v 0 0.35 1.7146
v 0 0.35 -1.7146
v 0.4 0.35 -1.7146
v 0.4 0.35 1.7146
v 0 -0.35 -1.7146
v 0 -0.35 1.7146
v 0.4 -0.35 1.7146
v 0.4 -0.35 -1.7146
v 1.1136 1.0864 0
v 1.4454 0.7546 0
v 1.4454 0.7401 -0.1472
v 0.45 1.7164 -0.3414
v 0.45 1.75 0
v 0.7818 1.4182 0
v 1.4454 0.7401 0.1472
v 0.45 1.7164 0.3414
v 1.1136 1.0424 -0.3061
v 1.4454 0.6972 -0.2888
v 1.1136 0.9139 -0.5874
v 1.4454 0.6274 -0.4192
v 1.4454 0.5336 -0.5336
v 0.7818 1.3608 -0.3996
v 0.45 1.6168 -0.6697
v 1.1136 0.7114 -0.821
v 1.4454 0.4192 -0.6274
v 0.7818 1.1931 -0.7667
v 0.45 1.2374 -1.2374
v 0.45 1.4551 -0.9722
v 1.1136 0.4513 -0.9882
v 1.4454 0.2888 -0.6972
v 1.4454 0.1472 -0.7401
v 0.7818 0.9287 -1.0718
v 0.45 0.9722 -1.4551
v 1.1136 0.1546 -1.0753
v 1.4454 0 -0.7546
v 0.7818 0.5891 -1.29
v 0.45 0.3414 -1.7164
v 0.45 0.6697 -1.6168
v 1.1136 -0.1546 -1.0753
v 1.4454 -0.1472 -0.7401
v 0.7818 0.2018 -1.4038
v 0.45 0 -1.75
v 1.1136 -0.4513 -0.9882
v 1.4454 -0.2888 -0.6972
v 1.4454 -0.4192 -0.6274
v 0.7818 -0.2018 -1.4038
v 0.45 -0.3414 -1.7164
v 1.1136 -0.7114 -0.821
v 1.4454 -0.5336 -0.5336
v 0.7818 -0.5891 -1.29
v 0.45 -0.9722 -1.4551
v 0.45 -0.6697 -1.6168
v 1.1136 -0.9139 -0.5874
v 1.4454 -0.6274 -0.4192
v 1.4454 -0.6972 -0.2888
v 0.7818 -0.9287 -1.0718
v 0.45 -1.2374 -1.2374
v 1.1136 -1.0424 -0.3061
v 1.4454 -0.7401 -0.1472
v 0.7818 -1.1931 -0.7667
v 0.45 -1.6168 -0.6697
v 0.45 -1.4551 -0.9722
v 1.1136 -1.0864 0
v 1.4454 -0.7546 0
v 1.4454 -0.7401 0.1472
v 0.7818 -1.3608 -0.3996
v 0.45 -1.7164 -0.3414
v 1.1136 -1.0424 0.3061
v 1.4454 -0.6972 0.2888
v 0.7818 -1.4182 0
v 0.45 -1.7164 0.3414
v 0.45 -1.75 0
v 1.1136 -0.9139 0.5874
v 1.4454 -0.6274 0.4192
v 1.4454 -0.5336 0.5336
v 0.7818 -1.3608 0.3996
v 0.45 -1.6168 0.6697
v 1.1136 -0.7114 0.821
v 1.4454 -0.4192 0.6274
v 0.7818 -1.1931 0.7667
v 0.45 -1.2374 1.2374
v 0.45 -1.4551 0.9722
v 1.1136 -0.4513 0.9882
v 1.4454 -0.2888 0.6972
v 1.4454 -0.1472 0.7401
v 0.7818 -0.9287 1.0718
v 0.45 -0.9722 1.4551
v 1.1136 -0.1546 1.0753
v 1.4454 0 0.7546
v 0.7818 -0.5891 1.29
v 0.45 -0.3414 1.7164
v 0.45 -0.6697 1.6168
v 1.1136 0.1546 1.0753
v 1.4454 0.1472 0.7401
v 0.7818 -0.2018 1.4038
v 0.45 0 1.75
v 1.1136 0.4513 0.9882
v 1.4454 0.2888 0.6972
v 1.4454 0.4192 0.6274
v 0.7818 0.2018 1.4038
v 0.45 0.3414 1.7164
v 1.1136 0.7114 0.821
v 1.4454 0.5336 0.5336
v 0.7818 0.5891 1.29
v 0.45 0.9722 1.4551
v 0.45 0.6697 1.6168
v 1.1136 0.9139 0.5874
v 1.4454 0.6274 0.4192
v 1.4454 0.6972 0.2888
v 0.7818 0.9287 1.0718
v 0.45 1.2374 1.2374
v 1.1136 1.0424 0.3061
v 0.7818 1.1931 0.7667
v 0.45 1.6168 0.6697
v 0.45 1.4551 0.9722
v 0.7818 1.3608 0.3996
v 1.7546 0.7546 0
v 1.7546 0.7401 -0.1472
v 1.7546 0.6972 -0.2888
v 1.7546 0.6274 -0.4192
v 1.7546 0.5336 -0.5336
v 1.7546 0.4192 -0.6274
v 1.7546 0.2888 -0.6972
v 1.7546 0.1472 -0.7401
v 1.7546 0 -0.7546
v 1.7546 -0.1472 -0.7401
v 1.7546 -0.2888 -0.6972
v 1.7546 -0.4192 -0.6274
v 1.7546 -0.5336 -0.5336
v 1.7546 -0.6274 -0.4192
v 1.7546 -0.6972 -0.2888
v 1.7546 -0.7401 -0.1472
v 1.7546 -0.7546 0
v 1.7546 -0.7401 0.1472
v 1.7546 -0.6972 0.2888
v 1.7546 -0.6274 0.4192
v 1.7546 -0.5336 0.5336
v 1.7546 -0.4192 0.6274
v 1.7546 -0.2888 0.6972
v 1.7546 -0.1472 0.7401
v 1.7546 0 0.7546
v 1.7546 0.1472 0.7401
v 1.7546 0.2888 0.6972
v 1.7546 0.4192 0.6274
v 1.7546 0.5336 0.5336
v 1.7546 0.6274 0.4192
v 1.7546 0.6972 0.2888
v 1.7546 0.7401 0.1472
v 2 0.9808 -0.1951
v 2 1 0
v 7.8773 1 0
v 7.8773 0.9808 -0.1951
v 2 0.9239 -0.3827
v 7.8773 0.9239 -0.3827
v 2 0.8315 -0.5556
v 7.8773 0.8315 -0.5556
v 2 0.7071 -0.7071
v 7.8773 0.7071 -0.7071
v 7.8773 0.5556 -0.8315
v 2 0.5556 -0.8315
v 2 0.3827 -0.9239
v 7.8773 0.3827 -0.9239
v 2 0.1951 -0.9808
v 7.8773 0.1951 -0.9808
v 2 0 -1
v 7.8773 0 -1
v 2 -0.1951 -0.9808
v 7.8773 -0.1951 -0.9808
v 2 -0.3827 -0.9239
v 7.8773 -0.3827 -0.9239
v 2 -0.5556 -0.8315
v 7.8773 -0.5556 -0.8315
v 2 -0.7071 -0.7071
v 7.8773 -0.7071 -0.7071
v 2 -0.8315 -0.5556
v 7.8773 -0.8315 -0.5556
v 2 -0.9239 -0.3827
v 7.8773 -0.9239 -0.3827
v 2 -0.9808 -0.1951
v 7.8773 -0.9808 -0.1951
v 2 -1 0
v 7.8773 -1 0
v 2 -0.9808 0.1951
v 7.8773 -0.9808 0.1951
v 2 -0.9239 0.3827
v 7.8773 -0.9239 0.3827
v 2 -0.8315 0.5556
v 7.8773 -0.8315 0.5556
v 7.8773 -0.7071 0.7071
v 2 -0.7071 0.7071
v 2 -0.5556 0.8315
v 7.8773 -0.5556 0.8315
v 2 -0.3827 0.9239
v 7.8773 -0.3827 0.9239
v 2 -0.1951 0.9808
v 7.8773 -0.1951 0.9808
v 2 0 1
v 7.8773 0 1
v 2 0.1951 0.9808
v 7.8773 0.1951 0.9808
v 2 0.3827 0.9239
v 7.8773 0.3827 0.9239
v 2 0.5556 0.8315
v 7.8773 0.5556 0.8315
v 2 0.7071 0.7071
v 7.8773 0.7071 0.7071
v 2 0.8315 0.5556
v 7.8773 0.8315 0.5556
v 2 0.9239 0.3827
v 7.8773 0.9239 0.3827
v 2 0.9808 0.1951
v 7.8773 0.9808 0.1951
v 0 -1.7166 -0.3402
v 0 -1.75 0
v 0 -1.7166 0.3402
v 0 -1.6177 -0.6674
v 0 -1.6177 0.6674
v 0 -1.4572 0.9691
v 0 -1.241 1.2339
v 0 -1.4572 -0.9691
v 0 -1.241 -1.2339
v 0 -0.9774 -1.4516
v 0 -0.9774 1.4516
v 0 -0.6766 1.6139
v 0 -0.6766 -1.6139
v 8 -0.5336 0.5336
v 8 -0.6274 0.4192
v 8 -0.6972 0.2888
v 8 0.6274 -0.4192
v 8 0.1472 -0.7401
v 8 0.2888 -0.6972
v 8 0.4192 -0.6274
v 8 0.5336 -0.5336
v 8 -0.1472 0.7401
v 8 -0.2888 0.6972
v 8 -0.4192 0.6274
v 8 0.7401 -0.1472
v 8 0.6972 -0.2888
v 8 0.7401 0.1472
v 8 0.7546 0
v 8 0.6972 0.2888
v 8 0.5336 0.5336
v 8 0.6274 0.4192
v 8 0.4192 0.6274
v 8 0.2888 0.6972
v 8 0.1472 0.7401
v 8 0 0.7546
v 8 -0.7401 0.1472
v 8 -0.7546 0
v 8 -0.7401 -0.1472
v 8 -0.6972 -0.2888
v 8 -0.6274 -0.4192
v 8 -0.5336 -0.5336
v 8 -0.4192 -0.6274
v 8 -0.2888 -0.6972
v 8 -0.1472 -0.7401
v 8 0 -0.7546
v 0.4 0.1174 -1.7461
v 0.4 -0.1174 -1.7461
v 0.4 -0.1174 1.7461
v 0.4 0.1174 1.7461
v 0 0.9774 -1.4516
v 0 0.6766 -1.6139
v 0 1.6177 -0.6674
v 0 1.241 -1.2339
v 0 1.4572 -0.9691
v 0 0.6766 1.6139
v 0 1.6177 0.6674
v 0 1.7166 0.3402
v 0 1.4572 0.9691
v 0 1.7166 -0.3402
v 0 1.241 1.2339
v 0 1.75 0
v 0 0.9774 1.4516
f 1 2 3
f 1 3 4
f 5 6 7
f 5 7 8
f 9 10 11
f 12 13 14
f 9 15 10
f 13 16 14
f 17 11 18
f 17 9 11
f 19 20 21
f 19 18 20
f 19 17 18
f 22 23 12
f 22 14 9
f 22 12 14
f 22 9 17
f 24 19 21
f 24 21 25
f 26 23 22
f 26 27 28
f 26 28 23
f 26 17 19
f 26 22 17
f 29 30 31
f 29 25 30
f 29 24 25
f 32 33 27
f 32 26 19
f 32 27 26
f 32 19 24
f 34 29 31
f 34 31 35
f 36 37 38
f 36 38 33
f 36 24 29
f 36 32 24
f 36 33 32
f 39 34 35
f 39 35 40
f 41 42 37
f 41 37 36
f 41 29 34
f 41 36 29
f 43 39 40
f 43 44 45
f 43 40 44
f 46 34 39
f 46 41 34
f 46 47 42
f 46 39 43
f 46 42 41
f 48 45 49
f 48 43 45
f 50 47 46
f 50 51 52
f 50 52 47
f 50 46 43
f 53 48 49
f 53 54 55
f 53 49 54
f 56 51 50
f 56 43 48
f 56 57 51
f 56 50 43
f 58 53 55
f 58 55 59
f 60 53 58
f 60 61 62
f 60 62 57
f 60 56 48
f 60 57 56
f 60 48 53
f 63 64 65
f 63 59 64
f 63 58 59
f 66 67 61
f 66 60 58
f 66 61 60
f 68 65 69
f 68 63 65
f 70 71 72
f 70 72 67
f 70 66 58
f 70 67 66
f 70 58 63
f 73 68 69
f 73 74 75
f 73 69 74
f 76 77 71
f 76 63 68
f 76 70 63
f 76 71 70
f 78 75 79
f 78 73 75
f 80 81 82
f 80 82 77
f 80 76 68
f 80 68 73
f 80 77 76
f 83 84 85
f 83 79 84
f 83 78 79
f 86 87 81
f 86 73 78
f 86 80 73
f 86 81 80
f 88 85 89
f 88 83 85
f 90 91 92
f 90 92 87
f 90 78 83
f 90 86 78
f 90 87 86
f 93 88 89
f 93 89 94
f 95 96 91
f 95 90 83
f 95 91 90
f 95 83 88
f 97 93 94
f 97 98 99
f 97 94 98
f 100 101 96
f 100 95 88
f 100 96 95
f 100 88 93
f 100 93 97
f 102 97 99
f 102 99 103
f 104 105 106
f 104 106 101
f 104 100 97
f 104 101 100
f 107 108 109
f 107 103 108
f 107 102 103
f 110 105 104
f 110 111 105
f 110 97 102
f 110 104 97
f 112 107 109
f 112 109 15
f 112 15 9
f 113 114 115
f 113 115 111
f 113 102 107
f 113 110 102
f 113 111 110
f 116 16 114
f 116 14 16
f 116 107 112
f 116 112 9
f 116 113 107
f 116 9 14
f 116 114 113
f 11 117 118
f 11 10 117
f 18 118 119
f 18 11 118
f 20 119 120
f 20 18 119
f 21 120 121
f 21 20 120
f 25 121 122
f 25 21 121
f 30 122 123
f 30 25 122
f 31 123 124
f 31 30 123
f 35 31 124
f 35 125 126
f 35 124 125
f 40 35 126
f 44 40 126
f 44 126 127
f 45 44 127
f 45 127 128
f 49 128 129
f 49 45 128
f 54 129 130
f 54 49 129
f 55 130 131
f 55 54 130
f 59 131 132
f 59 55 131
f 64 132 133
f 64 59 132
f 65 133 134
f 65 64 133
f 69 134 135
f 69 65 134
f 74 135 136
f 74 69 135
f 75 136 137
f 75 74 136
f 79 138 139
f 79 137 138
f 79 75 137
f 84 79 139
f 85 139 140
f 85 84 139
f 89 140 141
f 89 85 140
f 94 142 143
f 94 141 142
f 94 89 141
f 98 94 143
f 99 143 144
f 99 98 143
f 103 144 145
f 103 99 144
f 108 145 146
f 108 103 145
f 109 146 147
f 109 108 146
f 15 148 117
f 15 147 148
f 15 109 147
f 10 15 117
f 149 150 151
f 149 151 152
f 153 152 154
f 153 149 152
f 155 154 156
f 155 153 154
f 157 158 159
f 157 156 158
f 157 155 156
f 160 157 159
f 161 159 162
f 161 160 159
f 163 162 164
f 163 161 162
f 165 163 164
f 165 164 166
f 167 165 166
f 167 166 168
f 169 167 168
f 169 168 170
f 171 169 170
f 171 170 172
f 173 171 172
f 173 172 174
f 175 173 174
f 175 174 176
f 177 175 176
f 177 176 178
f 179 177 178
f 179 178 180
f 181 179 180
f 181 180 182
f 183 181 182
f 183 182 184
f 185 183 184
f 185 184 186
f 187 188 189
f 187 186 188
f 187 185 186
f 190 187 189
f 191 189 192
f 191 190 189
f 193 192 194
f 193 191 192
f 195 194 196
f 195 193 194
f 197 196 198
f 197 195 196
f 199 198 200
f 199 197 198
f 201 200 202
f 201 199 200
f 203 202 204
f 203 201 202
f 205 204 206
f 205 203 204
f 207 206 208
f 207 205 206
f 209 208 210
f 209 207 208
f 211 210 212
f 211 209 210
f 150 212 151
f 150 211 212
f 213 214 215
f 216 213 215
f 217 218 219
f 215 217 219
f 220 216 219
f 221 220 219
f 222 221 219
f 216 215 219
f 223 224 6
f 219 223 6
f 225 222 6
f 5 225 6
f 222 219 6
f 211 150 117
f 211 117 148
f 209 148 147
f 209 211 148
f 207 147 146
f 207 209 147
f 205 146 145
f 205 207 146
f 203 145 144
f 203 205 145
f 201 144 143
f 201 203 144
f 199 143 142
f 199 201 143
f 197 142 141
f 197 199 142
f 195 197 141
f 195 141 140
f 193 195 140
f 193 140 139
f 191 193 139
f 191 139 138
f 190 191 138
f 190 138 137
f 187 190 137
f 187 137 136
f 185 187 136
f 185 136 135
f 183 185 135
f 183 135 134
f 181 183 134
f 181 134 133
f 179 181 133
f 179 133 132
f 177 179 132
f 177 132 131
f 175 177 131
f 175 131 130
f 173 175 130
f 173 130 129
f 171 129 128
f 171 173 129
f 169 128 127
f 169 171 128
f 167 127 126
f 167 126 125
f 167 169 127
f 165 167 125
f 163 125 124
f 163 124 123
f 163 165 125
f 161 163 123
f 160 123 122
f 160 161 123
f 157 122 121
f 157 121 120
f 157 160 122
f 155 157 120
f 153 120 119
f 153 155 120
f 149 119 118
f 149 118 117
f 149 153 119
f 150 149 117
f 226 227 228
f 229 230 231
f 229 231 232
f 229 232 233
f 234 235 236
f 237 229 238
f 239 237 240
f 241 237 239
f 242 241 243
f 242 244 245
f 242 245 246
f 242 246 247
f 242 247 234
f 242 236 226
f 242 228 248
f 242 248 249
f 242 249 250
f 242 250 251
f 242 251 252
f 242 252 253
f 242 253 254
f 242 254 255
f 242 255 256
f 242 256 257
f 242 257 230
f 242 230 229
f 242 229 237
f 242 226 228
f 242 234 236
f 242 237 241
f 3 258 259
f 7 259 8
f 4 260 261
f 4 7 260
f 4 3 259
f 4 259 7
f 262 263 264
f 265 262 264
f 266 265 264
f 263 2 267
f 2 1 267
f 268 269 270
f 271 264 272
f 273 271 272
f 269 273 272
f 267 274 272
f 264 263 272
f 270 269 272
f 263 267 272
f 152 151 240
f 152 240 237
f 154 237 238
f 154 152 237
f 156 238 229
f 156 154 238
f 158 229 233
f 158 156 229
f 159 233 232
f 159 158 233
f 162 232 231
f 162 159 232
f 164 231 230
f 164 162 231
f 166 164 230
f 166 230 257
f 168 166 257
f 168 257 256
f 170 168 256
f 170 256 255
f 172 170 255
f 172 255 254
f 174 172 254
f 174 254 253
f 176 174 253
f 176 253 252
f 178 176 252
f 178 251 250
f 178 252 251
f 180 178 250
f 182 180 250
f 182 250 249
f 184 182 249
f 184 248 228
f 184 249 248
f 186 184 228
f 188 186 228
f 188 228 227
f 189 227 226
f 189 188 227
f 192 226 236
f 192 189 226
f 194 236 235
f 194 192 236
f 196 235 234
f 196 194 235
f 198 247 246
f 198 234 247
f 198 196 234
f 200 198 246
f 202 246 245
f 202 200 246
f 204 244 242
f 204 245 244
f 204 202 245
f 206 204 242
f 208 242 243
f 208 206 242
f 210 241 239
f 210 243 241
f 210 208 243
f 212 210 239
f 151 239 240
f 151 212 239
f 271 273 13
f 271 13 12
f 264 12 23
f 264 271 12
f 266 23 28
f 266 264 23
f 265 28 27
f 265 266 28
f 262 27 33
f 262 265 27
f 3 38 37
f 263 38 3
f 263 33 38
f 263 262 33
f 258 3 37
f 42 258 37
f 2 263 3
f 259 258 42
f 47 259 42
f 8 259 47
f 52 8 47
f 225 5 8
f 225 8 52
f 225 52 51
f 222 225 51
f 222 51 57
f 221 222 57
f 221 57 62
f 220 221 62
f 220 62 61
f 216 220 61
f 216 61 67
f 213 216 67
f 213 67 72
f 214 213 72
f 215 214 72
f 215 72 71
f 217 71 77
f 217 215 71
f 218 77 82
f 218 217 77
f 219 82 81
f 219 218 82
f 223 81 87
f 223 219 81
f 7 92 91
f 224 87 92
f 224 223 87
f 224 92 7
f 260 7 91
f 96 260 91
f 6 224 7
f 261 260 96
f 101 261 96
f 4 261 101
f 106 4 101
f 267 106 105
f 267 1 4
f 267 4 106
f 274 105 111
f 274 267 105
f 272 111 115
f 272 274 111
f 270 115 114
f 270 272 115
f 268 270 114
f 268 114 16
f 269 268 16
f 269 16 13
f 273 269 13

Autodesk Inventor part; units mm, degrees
ref_plane "YZ Plane" through (0, 0, 0) normal (1, 0, 0) x (0, 1, 0)
ref_plane "XZ Plane" through (0, 0, 0) normal (0, 1, 0) x (-1, 0, 0)
sketch "Sketch1" plane through (0, 0, 0) normal (0, 0, 1) x (1, 0, 0)
  line L0 (0, 0) -> (8, 0)
  line L1 (8, 0) -> (8, 1)
  line L2 (8, 1) -> (2, 1)
  line L3 (2, 1) -> (1.7546, 0.7546)
  line L4 (1.7546, 0.7546) -> (1.4454, 0.7546)
  line L5 (1.4454, 0.7546) -> (0.45, 1.75)
  line L6 (0.45, 1.75) -> (0, 1.75)
  line L7 (0, 1.75) -> (0, 0)
  line L8 (2, 1) -> (1.2, 1) construction
  line L9 (-1.6, 0) -> (9.6, 0) projected
  line L10 (0, 2.1) -> (0, -0.35) projected
  dimension "d0" = 8
  dimension "d1" = 45
  dimension "d2" = 0.2454
  dimension "d3" = 6
  dimension "d4" = 1.2
  dimension "d5" = 1.5092
  dimension "d6" = 2
  dimension "d7" = 3.5
revolve "Body" add sketch "Sketch1" angle 360 about axis through (0, 0, 0) along (1, 0, 0)
sketch "Sketch2" plane through (0, 0, 0) normal (-1, 0, 0) x (0, 0, 1)
  line L0 (1.75, -0.35) -> (-1.75, -0.35)
  line L1 (-1.75, -0.35) -> (-1.75, 0.35)
  line L2 (-1.75, 0.35) -> (1.75, 0.35)
  line L3 (1.75, 0.35) -> (1.75, -0.35)
  line L4 (0, 0.35) -> (0, -0.35) construction
  line L5 (-1.75, 0) -> (1.75, 0) construction
  line L6 (0, 1.75) -> (0, 0) projected
  dimension "d15" = 0.7
  dimension "d16" = 3.5
extrude "Slot" cut sketch "Sketch2" against normal blind 0.4
thread "Thread" size "M2x0.4" class "6g" standard "ISO Metric profile" length 6
chamfer "Chamfer1" distance 0.2454 distance2 0.1227 1 edges at (8, -1, 0) measured on face at (8, -0.0858, 0.7069)
ref_plane "Work Plane1" through (33.575, 0, 0) normal (0, 0, -1) x (1, 0, 0)
equation "\"d0\" = NLG"
equation "\"d1\" = 0.5 * SEWI"
equation "\"d2\" = GAL"
equation "\"d3\" = GEL"
equation "\"d4\" = KOH"
equation "\"d5\" = BDM"
equation "\"d6\" = GD"
equation "\"d7\" = KOD"
equation "\"d15\" = SBR"
equation "\"d16\" = KOD"
equation "\"d8\" = STI"
equation "\"d10\" = GEL"
equation "\"d12\" = -0.5 * SPD + 0.5 * GD"
equation "\"d13\" = 0.5 * GAL"
equation "\"NLG\" = 8"
equation "\"GAL\" = 0.61345 * PTC"
equation "\"GEL\" = 6"
equation "\"KOH\" = 1.2"
equation "\"KOD\" = 3.5"
equation "\"SEWI\" = 90deg"
equation "\"BDM\" = NND - 1.2269 * PTC"
equation "\"GD\" = NND"
equation "\"SBR\" = 0.7"
equation "\"STI\" = 0.4"
equation "\"SPD\" = NND - 1.2269 * PTC"
equation "\"GUL\" = 0.61345 * PTC"
equation "\"PTC\" = 0.4"
equation "\"EPV\" = 2.2"
equation "\"THREADDIA\" = 2"
equation "\"TOA\" = 30deg"
equation "\"RR\" = 0.2"
equation "\"NND\" = 2"
equation "\"GD1\" = THREADDIA - 1.2269 * PTC"
properties part number "AS 1427 - M2 x 8(8)" material "Steel, Mild"
